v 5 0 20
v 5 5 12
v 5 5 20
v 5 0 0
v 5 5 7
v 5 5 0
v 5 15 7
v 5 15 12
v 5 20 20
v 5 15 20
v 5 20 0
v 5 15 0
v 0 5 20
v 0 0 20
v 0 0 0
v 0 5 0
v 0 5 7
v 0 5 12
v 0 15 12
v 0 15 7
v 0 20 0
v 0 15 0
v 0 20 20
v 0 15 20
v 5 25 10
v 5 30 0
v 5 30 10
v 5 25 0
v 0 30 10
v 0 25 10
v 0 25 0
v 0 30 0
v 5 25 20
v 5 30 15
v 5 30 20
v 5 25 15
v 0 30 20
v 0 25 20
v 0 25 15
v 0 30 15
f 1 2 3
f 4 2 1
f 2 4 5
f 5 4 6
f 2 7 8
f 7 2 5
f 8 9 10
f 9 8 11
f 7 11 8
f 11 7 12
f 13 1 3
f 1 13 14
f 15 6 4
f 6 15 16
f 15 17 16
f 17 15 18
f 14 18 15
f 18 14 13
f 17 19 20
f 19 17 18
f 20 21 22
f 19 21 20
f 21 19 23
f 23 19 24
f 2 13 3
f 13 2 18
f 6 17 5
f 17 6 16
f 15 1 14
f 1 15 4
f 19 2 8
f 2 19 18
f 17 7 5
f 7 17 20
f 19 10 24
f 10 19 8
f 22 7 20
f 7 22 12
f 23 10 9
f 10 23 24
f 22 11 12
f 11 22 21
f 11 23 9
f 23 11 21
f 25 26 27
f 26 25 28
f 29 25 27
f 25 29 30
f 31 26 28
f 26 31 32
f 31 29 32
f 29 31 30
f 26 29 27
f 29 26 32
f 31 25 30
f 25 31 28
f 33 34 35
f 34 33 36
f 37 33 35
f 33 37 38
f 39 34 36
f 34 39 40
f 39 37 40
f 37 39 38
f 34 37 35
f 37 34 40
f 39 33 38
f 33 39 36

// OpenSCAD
//the message should read "Hi"

//correct answers:
color("MidnightBlue")
translate([0,0,0]) scale([0.5,0.5,2]) cube(10);

color("MidnightBlue")
translate([0,5,7]) scale([0.5,1,0.5]) cube(10);

color("MidnightBlue")
translate([0,15,0]) scale([0.5,0.5,2]) cube(10);

color("DarkRed")
translate([0,25,0]) scale([0.5,0.5,1]) cube(10);

color("DarkRed")
translate([0,25,15]) scale([0.5,0.5,0.5]) cube(10);

//Question 1- incorrect answers
/*color("Red") translate([0,0,20]) {sphere(10);}

color("Blue") cylinder(h=100, r1=2, r2=25, center = false);*/

//Question 2- incorrect answers     
/*color("SpringGreen") rotate_extrude(convexity = 18) translate([12, 0, 2]) circle(r = 4);

color("SlateBlue") cylinder(h=8, r1=0.5, r2=22, center = true);
*/

//Question 3- incorrect answers
/*color("Lime")
    translate ([0,0,0]) scale ([0.1,0.6,0.40]) cube (50);
    
color ("HotPink")
    translate([3,20,0]) scale (0.05)
    sphere(100);
*/

//Question 4- incorrect answers
/*color("Chocolate")
    cylinder (h=10, r1=15, r2=10, center=false); 
    
 color("LightBlue")
    sphere(10);
 */
 
 //Question 5-incorrect answers
 /* color("MidnightBlue")
    translate([0,5,7]) scale([0.5,1,0.5]) cube(10); 
    
color("Aquamarine")
    translate([10,10,10])
    scale([0.25,0.25,1])
    cube(5);
*/
